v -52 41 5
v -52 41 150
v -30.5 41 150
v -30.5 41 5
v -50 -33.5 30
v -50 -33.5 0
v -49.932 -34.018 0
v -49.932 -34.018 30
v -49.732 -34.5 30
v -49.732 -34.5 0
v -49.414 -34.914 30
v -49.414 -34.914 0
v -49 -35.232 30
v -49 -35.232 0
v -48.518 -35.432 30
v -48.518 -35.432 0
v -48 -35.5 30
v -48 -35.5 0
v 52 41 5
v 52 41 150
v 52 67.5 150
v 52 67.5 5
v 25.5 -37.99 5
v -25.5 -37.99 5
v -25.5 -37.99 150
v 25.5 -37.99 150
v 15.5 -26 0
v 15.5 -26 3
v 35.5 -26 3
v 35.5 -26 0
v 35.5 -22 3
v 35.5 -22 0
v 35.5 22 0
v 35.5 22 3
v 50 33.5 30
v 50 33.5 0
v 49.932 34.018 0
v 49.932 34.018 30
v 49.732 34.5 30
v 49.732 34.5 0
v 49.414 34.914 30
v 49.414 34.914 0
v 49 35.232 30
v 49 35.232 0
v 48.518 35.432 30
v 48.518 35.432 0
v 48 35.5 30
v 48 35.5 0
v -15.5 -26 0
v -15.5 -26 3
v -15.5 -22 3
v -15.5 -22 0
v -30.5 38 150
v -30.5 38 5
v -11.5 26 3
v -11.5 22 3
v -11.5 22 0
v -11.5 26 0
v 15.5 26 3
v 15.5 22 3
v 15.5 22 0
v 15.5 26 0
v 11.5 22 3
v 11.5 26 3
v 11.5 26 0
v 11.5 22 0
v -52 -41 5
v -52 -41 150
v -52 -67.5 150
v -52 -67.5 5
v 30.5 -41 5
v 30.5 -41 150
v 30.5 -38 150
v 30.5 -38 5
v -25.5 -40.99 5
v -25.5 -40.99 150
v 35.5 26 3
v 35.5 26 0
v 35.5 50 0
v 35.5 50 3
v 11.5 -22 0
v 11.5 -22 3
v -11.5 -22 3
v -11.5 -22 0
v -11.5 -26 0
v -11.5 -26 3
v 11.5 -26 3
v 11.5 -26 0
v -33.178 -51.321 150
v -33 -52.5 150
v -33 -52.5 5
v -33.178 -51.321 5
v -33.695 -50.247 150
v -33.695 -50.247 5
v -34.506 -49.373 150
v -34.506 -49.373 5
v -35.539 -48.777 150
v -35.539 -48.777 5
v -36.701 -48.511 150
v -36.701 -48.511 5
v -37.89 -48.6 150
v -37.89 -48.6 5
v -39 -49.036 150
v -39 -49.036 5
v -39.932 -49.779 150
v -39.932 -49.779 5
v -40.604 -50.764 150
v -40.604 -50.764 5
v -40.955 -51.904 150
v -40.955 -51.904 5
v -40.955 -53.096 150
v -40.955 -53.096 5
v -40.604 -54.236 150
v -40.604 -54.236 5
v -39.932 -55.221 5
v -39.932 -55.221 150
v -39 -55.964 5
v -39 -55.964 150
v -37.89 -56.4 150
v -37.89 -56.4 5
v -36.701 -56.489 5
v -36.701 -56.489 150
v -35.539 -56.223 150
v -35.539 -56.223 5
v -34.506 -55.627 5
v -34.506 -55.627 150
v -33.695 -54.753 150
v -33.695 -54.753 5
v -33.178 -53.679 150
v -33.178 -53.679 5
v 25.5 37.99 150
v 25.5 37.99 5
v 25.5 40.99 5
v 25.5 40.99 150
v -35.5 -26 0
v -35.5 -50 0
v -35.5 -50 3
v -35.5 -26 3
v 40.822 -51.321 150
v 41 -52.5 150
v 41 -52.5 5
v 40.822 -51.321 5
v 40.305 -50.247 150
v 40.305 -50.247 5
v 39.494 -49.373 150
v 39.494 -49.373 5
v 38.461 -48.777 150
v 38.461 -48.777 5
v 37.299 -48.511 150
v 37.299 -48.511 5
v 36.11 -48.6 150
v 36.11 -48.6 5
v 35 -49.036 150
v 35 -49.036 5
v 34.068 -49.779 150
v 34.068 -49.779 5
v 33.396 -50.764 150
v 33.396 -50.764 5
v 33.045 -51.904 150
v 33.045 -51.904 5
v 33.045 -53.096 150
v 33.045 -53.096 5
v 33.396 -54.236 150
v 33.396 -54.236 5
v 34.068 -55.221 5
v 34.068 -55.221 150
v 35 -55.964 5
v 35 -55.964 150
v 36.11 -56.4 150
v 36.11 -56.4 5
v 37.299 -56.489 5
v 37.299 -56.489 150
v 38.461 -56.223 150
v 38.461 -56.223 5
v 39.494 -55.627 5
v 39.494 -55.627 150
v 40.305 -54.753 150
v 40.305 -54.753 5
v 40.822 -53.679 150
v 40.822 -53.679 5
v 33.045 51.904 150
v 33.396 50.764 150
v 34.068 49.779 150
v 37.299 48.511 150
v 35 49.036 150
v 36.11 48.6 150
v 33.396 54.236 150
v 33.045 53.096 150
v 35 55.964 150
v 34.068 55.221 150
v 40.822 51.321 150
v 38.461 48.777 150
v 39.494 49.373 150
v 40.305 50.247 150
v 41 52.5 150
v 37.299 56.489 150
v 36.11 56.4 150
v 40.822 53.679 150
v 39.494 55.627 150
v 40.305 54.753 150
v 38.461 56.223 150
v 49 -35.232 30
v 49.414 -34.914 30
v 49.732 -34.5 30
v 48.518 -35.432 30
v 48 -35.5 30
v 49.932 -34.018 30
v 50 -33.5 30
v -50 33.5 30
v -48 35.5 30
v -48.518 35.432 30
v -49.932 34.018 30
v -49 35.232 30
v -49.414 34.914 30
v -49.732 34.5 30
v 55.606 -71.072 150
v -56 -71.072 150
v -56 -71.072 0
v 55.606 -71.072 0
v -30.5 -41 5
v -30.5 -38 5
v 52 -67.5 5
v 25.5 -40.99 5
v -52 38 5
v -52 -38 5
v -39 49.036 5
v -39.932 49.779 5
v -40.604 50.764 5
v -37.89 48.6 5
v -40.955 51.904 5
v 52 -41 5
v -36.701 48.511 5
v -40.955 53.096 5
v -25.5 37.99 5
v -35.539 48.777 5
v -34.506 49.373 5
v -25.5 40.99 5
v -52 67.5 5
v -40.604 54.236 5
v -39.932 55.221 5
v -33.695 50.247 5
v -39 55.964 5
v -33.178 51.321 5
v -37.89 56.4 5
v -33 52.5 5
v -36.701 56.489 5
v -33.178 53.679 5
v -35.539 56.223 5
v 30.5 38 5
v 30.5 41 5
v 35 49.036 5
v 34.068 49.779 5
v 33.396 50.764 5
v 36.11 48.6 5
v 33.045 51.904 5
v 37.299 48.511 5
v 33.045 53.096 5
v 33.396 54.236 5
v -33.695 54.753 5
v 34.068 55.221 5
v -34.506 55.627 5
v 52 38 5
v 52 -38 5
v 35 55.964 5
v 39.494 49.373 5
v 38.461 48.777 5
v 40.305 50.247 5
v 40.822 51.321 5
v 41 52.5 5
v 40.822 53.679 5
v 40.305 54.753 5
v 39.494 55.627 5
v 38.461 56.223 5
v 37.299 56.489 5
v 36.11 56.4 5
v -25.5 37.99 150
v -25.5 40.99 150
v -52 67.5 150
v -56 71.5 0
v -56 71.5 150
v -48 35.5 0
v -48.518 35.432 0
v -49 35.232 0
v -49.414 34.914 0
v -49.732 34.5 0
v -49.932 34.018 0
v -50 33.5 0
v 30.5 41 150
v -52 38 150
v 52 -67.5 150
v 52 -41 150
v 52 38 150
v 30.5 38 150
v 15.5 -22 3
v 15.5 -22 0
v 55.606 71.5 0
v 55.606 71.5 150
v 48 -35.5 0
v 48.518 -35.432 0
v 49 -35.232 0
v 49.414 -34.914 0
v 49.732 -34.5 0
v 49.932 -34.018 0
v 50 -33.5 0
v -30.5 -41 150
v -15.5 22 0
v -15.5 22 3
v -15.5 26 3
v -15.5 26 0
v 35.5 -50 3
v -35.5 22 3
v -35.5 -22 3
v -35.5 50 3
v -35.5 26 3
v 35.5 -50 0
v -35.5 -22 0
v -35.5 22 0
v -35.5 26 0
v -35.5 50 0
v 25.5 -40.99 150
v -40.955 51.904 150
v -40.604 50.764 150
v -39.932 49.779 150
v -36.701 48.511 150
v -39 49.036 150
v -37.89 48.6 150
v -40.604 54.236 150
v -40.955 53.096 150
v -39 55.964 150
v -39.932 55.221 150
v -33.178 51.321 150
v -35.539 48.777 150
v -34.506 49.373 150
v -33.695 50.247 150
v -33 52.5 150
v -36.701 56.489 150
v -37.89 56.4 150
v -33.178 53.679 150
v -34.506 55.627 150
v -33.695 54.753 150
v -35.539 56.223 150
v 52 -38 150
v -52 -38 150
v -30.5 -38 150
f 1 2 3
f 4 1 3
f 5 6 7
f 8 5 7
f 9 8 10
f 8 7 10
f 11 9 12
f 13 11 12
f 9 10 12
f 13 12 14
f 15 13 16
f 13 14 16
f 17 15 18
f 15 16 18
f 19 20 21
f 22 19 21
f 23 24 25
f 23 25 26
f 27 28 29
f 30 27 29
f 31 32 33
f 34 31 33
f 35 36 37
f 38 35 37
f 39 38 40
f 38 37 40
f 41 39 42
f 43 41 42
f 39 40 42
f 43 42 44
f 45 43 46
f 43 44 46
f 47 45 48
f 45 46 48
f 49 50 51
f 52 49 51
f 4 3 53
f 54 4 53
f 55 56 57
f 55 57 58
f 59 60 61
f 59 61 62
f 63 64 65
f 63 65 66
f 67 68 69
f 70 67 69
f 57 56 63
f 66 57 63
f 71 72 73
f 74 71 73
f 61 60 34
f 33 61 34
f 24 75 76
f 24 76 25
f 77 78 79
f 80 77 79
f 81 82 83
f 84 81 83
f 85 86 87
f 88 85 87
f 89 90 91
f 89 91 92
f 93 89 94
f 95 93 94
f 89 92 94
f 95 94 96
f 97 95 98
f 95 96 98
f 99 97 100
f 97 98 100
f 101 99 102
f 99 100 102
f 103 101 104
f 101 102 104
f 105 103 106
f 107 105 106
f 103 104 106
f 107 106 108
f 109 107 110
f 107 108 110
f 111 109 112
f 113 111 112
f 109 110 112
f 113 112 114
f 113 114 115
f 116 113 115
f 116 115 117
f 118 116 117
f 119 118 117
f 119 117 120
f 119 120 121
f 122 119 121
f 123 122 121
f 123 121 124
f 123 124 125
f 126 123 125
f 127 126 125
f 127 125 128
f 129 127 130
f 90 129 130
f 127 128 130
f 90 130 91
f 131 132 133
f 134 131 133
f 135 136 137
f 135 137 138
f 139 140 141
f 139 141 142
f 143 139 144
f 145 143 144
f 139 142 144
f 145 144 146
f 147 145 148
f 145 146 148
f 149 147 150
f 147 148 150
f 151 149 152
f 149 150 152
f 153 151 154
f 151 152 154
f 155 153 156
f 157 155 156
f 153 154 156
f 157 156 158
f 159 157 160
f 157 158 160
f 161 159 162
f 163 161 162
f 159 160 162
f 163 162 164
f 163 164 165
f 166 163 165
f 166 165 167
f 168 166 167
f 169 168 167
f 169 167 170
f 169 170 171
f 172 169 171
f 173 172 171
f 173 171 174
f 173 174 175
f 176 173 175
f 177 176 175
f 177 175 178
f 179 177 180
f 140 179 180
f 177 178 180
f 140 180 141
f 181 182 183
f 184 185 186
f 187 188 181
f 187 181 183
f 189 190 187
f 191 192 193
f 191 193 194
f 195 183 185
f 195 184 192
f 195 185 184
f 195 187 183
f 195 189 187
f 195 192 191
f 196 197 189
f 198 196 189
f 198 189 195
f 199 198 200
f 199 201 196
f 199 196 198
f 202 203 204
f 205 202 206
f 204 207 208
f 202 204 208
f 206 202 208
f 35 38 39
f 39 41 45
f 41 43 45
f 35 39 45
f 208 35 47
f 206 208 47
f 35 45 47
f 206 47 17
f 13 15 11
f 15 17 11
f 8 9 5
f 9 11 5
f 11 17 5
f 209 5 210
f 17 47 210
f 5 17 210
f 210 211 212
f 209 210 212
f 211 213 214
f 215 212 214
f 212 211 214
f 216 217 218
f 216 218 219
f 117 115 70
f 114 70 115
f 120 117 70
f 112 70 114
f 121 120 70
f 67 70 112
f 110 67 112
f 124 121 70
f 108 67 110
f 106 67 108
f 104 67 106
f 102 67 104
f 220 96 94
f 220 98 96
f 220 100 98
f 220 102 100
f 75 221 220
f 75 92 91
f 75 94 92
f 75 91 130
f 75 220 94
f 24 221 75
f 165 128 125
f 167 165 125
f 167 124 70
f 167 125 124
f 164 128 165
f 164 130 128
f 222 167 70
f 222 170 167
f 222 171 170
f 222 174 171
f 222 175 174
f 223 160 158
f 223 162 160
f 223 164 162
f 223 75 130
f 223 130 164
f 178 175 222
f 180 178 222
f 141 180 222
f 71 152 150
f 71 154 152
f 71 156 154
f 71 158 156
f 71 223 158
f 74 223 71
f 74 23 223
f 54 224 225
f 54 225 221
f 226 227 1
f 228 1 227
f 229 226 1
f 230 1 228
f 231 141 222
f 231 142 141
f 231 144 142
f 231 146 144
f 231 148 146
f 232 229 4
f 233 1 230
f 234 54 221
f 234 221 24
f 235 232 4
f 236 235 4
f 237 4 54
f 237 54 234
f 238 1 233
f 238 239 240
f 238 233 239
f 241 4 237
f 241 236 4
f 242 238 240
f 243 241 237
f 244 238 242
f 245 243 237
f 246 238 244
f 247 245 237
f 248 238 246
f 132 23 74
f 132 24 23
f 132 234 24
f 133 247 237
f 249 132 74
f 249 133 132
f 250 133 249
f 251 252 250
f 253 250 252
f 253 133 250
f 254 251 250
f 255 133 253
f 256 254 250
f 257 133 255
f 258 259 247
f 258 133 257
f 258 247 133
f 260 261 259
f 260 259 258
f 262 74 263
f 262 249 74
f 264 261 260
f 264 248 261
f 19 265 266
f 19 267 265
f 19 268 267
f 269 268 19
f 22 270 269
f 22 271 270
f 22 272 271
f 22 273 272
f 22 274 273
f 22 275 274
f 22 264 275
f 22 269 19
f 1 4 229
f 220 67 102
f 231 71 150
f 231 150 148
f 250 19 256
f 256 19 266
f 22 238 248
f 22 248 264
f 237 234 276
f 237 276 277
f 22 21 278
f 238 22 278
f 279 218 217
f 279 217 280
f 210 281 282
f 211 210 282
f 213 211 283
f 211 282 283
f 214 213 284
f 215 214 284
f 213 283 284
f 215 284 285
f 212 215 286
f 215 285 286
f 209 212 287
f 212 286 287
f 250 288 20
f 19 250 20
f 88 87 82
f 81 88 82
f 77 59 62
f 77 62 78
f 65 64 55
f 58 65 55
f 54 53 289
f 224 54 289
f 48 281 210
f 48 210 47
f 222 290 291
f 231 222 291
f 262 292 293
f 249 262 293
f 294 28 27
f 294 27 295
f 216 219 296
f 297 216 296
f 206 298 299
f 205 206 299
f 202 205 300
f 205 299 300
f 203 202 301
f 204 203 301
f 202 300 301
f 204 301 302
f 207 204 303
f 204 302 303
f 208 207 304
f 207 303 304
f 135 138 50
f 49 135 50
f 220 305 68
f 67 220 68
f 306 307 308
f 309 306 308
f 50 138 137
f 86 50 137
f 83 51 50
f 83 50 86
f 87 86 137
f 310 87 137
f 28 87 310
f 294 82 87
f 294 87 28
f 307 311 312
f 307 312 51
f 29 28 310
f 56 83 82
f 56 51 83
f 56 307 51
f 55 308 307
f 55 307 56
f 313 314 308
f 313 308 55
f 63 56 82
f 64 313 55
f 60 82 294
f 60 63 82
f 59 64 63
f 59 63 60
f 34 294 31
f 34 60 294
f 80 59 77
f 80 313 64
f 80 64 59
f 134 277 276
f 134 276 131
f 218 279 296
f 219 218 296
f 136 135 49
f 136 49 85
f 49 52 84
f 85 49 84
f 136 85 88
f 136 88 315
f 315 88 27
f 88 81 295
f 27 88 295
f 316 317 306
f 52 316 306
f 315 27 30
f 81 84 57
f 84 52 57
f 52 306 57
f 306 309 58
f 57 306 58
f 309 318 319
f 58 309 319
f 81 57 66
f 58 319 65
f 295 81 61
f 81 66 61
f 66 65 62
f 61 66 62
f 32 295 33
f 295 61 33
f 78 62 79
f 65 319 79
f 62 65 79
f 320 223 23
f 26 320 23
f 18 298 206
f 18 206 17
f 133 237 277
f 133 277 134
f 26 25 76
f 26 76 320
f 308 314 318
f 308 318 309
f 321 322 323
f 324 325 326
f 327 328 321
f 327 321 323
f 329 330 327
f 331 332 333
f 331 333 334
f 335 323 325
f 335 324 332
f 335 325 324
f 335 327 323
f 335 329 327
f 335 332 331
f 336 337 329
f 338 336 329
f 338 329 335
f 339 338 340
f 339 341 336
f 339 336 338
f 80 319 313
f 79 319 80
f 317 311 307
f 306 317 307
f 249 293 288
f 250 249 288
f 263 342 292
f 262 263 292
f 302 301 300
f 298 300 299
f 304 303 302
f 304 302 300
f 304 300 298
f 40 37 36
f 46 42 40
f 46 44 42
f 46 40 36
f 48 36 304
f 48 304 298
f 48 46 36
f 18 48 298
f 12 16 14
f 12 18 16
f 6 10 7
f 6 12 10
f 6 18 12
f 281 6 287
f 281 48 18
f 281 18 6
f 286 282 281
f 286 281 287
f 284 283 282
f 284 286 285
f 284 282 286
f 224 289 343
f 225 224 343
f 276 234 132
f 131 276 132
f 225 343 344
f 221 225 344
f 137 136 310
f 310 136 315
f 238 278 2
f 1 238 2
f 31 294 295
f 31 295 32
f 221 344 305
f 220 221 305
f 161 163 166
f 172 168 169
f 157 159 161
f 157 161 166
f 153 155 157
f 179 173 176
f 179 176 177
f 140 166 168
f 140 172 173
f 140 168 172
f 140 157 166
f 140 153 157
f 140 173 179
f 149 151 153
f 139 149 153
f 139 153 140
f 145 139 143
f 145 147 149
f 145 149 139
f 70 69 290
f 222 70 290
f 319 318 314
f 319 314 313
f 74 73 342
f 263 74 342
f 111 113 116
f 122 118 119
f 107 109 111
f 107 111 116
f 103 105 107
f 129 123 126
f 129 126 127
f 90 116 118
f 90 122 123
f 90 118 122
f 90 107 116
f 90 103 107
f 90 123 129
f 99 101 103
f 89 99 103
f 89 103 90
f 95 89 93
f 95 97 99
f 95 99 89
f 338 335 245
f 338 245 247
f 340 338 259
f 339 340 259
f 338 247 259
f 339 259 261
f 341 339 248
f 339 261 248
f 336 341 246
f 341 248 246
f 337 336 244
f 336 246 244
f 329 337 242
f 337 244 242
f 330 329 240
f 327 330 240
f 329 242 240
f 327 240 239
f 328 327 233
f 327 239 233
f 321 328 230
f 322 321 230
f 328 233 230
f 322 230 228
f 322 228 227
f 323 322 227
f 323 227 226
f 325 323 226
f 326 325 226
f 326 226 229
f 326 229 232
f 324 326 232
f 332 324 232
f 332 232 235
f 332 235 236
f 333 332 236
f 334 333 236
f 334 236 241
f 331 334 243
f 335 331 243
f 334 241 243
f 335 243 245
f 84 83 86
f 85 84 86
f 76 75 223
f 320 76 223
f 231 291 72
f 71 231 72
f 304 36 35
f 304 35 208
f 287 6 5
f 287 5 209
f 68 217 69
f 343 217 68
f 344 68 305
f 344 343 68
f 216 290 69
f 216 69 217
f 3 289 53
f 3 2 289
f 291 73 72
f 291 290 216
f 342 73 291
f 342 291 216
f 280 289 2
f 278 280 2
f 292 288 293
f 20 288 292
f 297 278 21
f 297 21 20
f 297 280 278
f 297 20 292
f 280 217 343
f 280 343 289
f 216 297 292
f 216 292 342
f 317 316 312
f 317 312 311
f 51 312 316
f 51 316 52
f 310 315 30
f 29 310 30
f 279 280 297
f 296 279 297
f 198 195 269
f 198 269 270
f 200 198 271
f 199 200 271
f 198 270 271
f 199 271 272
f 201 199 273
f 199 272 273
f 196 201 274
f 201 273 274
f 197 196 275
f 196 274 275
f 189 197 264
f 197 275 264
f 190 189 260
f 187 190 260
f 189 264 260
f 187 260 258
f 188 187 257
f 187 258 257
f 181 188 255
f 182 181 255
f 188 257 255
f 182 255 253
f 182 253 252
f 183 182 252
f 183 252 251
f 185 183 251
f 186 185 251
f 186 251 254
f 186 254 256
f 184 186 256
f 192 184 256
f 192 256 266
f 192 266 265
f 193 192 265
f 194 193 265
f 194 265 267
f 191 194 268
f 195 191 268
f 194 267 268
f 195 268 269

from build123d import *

# Parameters (mm, degrees)
SKETCH006_W     = 111.605694
SKETCH006_H     = 142.572304
PAD001_DEPTH    = 150
POCKET_DEPTH    = 145
SKETCH005_W     = 51
SKETCH005_H     = 3
PAD002_DEPTH    = 145
SKETCH004_R     = 4
PAD003_DEPTH    = 145
PAD_DEPTH       = 30
SKETCH008_W     = 71
SKETCH008_H     = 100
PAD004_DEPTH    = 3
SKETCH009_W     = 20
SKETCH009_H     = 4
POCKET001_DEPTH = 3.001


with BuildPart() as deck:
    # Sketch006 → Pad001 (new body)
    with BuildSketch(Plane.XY):
        with Locations((-0.197153, 0.213848)):
            Rectangle(SKETCH006_W, SKETCH006_H)
    extrude(amount=PAD001_DEPTH)

    # Sketch007 (on Face6 of Pad001) → Pocket (cut)
    with BuildSketch(Plane.XY.offset(150)):
        Polygon((-52, 67.5), (-52, 41), (-30.5, 41), (-30.5, 38), (-52, 38), (-52, -38), (-30.5, -38), (-30.5, -41), (-52, -41), (-52, -67.5), (52, -67.5), (52, -41), (30.5, -41), (30.5, -38), (52, -38), (52, 38), (30.5, 38), (30.5, 41), (52, 41), (52, 67.5), align=None)
    extrude(amount=-POCKET_DEPTH, mode=Mode.SUBTRACT)

    # Sketch005 (on Face27 of Pocket) → Pad002 (join)
    with BuildSketch(Plane.XY.offset(5)):
        with Locations((0, 39.490067)):
            Rectangle(SKETCH005_W, SKETCH005_H)
        with Locations((0, -39.490067)):
            Rectangle(SKETCH005_W, SKETCH005_H)
    extrude(amount=PAD002_DEPTH)

    # Sketch004 (on Face27 of Pad002) → Pad003 (join)
    with BuildSketch(Plane.XY.offset(5)):
        with Locations((-37, -52.5)):
            Circle(SKETCH004_R)
        with Locations((37, -52.5)):
            Circle(SKETCH004_R)
        with Locations((-37, 52.5)):
            Circle(SKETCH004_R)
        with Locations((37, 52.5)):
            Circle(SKETCH004_R)
    extrude(amount=PAD003_DEPTH)


with BuildPart() as card:
    # Sketch001 → Pad (new body)
    with BuildSketch(Plane.XY):
        with BuildLine():
            Line((-48, 35.5), (48, 35.5))
            ThreePointArc((50, 33.5), (49.414214, 34.914214), (48, 35.5))
            Line((50, 33.5), (50, -33.5))
            ThreePointArc((48, -35.5), (49.414214, -34.914214), (50, -33.5))
            Line((48, -35.5), (-48, -35.5))
            ThreePointArc((-50, -33.5), (-49.414214, -34.914214), (-48, -35.5))
            Line((-50, -33.5), (-50, 33.5))
            ThreePointArc((-48, 35.5), (-49.414214, 34.914214), (-50, 33.5))
        make_face()
    extrude(amount=PAD_DEPTH)


with BuildPart() as body002:
    # Sketch008 → Pad004 (new body)
    with BuildSketch(Plane.XY):
        Rectangle(SKETCH008_W, SKETCH008_H)
    extrude(amount=PAD004_DEPTH)

    # Sketch009 (on Face6 of Pad004) → Pocket001 (cut, through all)
    with BuildSketch(Plane.XY.offset(3)):
        with Locations((-25.5, 24)):
            Rectangle(SKETCH009_W, SKETCH009_H)
        Polygon((-11.5, 26), (0, 26), (11.5, 26), (11.5, 22), (0, 22), (-11.5, 22), align=None)
        with Locations((25.5, 24)):
            Rectangle(SKETCH009_W, SKETCH009_H)
        with Locations((-25.5, -24)):
            Rectangle(SKETCH009_W, SKETCH009_H)
        Polygon((-11.5, -26), (0, -26), (11.5, -26), (11.5, -22), (0, -22), (-11.5, -22), align=None)
        with Locations((25.5, -24)):
            Rectangle(SKETCH009_W, SKETCH009_H)
    extrude(amount=-POCKET001_DEPTH, mode=Mode.SUBTRACT)


solid = Compound([deck.part, card.part, body002.part])
